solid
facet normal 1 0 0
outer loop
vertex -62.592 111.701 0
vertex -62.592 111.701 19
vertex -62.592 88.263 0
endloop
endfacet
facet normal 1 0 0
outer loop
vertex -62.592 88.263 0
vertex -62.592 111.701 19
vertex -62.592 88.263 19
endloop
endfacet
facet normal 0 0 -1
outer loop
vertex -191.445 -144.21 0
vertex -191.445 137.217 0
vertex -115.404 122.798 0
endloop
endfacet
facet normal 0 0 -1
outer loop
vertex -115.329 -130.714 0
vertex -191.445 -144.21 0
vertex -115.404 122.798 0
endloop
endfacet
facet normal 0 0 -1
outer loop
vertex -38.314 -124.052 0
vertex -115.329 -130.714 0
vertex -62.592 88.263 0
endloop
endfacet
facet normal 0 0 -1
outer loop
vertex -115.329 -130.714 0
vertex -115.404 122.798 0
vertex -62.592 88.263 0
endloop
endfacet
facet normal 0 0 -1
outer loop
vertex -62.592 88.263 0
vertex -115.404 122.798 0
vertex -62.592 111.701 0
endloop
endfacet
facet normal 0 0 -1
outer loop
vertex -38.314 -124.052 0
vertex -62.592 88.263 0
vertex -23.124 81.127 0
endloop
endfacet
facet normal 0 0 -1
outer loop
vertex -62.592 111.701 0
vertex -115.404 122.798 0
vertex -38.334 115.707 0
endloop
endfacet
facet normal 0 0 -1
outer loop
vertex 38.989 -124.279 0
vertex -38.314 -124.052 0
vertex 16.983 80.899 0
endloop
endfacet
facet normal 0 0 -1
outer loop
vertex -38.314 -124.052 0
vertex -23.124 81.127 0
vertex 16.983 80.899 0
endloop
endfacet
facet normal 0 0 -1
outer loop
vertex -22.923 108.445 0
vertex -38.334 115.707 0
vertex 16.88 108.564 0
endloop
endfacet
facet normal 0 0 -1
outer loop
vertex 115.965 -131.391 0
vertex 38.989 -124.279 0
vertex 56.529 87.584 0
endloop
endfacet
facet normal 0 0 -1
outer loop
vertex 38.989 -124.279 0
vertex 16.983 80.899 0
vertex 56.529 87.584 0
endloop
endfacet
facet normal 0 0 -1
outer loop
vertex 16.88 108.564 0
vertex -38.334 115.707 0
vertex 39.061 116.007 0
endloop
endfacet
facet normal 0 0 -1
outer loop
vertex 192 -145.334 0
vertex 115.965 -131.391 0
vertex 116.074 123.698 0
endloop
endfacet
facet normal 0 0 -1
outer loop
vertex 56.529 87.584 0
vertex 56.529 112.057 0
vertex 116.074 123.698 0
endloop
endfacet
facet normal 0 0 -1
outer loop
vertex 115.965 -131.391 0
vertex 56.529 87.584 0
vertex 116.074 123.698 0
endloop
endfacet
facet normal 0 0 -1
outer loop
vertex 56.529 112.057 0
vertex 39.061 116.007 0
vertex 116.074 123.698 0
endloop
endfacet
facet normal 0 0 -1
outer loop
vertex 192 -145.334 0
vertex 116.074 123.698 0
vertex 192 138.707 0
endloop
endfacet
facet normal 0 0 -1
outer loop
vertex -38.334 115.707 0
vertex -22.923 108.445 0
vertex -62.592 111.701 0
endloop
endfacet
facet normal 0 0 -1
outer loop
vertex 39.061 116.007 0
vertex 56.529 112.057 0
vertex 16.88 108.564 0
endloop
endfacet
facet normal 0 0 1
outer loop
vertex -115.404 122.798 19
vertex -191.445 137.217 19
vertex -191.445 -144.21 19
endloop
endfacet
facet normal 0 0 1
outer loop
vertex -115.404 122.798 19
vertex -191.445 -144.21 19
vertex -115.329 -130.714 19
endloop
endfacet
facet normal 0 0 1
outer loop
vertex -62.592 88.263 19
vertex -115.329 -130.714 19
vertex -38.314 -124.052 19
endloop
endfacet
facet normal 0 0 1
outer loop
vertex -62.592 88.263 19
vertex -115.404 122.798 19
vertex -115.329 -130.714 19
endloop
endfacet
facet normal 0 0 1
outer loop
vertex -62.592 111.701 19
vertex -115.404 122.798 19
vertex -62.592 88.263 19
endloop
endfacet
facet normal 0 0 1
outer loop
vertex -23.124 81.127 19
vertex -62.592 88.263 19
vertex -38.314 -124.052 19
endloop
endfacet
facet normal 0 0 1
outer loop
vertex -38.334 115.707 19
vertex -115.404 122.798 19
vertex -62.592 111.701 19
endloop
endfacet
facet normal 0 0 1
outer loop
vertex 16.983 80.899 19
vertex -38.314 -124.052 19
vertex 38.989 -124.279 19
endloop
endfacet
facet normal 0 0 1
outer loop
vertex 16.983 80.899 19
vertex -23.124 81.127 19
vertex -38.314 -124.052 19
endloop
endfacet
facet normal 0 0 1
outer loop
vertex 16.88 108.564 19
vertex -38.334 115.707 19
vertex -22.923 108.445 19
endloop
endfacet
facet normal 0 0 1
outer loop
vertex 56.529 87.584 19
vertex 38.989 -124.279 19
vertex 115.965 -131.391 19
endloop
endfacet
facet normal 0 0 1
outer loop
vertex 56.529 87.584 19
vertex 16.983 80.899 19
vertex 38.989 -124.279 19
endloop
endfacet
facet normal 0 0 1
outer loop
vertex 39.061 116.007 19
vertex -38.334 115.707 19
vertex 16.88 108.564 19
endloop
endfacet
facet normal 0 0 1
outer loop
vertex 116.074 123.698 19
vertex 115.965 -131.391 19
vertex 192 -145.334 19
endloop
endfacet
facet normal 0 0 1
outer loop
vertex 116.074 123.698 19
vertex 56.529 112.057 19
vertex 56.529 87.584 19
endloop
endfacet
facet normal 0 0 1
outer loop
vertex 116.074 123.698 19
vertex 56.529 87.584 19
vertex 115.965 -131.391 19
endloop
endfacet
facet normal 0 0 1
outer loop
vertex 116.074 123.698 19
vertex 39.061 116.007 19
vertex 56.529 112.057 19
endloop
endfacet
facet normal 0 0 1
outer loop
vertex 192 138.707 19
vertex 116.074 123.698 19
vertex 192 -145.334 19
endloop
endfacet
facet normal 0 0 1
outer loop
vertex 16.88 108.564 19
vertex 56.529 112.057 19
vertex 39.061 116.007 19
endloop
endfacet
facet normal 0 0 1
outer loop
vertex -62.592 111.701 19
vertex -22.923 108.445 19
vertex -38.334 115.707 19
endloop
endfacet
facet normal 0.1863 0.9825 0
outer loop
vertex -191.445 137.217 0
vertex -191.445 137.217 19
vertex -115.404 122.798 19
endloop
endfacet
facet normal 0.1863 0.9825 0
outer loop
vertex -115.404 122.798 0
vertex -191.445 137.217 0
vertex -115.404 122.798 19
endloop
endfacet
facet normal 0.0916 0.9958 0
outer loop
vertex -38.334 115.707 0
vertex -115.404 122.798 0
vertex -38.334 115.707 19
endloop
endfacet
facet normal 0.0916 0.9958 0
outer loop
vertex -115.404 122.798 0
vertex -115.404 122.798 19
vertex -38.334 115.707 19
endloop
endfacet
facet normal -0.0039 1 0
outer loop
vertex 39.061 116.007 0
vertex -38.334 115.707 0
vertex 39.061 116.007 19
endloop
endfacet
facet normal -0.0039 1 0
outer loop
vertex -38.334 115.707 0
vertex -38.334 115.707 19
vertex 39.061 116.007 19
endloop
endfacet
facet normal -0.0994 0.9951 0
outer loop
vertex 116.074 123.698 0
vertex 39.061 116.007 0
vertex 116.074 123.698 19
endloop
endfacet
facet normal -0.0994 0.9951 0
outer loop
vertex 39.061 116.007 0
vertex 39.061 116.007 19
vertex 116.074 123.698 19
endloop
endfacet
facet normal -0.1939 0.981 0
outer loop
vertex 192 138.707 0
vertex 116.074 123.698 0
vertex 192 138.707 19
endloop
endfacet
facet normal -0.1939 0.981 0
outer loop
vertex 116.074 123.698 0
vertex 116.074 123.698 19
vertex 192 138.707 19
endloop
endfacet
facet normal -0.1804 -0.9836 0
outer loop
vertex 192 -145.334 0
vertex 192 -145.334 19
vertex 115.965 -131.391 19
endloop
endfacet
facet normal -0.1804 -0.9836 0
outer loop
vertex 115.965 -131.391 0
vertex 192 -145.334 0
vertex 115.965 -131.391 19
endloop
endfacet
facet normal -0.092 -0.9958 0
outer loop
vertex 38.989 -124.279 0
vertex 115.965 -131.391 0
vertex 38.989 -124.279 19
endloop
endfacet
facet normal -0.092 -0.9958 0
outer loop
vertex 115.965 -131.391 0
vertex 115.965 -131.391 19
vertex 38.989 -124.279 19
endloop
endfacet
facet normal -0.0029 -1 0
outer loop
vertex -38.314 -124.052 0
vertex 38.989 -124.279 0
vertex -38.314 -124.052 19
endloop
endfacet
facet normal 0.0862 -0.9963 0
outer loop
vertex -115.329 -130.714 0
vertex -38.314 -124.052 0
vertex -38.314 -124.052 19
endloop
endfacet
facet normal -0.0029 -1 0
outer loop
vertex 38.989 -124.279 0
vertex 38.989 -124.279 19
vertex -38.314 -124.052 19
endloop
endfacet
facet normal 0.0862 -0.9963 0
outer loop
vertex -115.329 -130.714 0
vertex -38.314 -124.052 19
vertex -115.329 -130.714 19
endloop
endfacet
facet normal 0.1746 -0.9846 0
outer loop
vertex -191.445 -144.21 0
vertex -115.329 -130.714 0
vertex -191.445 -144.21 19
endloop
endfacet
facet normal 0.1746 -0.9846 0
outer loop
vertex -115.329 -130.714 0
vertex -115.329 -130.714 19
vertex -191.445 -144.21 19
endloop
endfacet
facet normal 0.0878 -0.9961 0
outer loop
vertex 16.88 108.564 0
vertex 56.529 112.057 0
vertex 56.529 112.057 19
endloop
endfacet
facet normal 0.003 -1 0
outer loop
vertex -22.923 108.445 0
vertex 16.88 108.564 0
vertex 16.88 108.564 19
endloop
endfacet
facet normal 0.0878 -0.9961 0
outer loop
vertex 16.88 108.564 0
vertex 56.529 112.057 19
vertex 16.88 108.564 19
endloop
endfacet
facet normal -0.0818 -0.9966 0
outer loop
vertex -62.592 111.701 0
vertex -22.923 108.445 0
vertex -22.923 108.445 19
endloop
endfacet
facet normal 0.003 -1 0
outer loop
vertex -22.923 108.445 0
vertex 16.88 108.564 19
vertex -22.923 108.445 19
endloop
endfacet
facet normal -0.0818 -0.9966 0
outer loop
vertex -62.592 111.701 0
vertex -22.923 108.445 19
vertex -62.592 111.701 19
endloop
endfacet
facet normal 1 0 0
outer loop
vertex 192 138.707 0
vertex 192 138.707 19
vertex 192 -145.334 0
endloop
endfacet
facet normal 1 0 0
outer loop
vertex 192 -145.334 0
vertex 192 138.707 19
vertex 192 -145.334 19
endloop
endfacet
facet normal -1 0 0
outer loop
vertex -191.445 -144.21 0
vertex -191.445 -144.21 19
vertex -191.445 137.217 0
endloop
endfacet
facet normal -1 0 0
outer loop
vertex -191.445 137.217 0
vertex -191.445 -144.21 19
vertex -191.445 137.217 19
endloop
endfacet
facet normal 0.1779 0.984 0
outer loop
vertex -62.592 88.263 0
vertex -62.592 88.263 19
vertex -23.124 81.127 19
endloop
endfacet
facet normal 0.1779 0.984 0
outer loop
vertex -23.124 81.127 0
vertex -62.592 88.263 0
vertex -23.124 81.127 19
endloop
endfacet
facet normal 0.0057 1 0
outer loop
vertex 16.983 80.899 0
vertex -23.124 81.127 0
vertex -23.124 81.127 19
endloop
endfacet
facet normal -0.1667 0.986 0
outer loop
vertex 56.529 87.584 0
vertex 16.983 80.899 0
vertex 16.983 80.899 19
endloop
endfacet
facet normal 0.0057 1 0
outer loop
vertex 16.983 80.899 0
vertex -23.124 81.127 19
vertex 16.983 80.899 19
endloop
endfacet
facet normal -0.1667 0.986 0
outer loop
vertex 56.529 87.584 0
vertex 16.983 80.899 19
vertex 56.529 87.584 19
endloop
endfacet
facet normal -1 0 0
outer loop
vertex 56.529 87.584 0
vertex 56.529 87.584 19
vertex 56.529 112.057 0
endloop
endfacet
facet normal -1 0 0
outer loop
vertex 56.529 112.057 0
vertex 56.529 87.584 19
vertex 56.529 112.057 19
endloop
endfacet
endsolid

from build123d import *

# Parameters (mm, degrees)
F0_W     = 400
F0_H     = 350
F1_DEPTH = 19
F2_W     = 400
F2_H     = 350
F3_DEPTH = 19.001
F5_DEPTH = 19.001


with BuildPart() as f1:
    # F0 (on Top) → F1 (new body)
    with BuildSketch(Plane.XY):
        with Locations((0, -4.671676)):
            Rectangle(F0_W, F0_H)
    extrude(amount=F1_DEPTH)

    # F2 (on face) → F3 (cut, through all)
    with BuildSketch(Plane.XY.offset(19)):
        with Locations((0, -4.671676)):
            Rectangle(F2_W, F2_H)
        with BuildLine():
            ThreePointArc((192.000002, -145.333663), (0.340362, -123.303121), (-191.445097, -144.210055))
            Line((-191.445097, -144.210055), (-191.445097, 137.21716))
            ThreePointArc((-191.445097, 137.21716), (0.366935, 114.931669), (192.000002, 138.707012))
            Line((192.000002, 138.707012), (192.000002, -145.333663))
        make_face(mode=Mode.SUBTRACT)
    extrude(amount=-F3_DEPTH, mode=Mode.SUBTRACT)

    # F4 (on face) → F5 (cut, through all)
    with BuildSketch(Plane.XY.offset(19)):
        with BuildLine():
            ThreePointArc((56.528851, 112.057194), (-3.020095, 108.082536), (-62.591754, 111.70088))
            Line((-62.591754, 111.70088), (-62.591754, 88.262614))
            ThreePointArc((-62.591754, 88.262614), (-3.075748, 80.144421), (56.528851, 87.584293))
            Line((56.528851, 87.584293), (56.528851, 112.057194))
        make_face()
    extrude(amount=-F5_DEPTH, mode=Mode.SUBTRACT)


solid = f1.part
